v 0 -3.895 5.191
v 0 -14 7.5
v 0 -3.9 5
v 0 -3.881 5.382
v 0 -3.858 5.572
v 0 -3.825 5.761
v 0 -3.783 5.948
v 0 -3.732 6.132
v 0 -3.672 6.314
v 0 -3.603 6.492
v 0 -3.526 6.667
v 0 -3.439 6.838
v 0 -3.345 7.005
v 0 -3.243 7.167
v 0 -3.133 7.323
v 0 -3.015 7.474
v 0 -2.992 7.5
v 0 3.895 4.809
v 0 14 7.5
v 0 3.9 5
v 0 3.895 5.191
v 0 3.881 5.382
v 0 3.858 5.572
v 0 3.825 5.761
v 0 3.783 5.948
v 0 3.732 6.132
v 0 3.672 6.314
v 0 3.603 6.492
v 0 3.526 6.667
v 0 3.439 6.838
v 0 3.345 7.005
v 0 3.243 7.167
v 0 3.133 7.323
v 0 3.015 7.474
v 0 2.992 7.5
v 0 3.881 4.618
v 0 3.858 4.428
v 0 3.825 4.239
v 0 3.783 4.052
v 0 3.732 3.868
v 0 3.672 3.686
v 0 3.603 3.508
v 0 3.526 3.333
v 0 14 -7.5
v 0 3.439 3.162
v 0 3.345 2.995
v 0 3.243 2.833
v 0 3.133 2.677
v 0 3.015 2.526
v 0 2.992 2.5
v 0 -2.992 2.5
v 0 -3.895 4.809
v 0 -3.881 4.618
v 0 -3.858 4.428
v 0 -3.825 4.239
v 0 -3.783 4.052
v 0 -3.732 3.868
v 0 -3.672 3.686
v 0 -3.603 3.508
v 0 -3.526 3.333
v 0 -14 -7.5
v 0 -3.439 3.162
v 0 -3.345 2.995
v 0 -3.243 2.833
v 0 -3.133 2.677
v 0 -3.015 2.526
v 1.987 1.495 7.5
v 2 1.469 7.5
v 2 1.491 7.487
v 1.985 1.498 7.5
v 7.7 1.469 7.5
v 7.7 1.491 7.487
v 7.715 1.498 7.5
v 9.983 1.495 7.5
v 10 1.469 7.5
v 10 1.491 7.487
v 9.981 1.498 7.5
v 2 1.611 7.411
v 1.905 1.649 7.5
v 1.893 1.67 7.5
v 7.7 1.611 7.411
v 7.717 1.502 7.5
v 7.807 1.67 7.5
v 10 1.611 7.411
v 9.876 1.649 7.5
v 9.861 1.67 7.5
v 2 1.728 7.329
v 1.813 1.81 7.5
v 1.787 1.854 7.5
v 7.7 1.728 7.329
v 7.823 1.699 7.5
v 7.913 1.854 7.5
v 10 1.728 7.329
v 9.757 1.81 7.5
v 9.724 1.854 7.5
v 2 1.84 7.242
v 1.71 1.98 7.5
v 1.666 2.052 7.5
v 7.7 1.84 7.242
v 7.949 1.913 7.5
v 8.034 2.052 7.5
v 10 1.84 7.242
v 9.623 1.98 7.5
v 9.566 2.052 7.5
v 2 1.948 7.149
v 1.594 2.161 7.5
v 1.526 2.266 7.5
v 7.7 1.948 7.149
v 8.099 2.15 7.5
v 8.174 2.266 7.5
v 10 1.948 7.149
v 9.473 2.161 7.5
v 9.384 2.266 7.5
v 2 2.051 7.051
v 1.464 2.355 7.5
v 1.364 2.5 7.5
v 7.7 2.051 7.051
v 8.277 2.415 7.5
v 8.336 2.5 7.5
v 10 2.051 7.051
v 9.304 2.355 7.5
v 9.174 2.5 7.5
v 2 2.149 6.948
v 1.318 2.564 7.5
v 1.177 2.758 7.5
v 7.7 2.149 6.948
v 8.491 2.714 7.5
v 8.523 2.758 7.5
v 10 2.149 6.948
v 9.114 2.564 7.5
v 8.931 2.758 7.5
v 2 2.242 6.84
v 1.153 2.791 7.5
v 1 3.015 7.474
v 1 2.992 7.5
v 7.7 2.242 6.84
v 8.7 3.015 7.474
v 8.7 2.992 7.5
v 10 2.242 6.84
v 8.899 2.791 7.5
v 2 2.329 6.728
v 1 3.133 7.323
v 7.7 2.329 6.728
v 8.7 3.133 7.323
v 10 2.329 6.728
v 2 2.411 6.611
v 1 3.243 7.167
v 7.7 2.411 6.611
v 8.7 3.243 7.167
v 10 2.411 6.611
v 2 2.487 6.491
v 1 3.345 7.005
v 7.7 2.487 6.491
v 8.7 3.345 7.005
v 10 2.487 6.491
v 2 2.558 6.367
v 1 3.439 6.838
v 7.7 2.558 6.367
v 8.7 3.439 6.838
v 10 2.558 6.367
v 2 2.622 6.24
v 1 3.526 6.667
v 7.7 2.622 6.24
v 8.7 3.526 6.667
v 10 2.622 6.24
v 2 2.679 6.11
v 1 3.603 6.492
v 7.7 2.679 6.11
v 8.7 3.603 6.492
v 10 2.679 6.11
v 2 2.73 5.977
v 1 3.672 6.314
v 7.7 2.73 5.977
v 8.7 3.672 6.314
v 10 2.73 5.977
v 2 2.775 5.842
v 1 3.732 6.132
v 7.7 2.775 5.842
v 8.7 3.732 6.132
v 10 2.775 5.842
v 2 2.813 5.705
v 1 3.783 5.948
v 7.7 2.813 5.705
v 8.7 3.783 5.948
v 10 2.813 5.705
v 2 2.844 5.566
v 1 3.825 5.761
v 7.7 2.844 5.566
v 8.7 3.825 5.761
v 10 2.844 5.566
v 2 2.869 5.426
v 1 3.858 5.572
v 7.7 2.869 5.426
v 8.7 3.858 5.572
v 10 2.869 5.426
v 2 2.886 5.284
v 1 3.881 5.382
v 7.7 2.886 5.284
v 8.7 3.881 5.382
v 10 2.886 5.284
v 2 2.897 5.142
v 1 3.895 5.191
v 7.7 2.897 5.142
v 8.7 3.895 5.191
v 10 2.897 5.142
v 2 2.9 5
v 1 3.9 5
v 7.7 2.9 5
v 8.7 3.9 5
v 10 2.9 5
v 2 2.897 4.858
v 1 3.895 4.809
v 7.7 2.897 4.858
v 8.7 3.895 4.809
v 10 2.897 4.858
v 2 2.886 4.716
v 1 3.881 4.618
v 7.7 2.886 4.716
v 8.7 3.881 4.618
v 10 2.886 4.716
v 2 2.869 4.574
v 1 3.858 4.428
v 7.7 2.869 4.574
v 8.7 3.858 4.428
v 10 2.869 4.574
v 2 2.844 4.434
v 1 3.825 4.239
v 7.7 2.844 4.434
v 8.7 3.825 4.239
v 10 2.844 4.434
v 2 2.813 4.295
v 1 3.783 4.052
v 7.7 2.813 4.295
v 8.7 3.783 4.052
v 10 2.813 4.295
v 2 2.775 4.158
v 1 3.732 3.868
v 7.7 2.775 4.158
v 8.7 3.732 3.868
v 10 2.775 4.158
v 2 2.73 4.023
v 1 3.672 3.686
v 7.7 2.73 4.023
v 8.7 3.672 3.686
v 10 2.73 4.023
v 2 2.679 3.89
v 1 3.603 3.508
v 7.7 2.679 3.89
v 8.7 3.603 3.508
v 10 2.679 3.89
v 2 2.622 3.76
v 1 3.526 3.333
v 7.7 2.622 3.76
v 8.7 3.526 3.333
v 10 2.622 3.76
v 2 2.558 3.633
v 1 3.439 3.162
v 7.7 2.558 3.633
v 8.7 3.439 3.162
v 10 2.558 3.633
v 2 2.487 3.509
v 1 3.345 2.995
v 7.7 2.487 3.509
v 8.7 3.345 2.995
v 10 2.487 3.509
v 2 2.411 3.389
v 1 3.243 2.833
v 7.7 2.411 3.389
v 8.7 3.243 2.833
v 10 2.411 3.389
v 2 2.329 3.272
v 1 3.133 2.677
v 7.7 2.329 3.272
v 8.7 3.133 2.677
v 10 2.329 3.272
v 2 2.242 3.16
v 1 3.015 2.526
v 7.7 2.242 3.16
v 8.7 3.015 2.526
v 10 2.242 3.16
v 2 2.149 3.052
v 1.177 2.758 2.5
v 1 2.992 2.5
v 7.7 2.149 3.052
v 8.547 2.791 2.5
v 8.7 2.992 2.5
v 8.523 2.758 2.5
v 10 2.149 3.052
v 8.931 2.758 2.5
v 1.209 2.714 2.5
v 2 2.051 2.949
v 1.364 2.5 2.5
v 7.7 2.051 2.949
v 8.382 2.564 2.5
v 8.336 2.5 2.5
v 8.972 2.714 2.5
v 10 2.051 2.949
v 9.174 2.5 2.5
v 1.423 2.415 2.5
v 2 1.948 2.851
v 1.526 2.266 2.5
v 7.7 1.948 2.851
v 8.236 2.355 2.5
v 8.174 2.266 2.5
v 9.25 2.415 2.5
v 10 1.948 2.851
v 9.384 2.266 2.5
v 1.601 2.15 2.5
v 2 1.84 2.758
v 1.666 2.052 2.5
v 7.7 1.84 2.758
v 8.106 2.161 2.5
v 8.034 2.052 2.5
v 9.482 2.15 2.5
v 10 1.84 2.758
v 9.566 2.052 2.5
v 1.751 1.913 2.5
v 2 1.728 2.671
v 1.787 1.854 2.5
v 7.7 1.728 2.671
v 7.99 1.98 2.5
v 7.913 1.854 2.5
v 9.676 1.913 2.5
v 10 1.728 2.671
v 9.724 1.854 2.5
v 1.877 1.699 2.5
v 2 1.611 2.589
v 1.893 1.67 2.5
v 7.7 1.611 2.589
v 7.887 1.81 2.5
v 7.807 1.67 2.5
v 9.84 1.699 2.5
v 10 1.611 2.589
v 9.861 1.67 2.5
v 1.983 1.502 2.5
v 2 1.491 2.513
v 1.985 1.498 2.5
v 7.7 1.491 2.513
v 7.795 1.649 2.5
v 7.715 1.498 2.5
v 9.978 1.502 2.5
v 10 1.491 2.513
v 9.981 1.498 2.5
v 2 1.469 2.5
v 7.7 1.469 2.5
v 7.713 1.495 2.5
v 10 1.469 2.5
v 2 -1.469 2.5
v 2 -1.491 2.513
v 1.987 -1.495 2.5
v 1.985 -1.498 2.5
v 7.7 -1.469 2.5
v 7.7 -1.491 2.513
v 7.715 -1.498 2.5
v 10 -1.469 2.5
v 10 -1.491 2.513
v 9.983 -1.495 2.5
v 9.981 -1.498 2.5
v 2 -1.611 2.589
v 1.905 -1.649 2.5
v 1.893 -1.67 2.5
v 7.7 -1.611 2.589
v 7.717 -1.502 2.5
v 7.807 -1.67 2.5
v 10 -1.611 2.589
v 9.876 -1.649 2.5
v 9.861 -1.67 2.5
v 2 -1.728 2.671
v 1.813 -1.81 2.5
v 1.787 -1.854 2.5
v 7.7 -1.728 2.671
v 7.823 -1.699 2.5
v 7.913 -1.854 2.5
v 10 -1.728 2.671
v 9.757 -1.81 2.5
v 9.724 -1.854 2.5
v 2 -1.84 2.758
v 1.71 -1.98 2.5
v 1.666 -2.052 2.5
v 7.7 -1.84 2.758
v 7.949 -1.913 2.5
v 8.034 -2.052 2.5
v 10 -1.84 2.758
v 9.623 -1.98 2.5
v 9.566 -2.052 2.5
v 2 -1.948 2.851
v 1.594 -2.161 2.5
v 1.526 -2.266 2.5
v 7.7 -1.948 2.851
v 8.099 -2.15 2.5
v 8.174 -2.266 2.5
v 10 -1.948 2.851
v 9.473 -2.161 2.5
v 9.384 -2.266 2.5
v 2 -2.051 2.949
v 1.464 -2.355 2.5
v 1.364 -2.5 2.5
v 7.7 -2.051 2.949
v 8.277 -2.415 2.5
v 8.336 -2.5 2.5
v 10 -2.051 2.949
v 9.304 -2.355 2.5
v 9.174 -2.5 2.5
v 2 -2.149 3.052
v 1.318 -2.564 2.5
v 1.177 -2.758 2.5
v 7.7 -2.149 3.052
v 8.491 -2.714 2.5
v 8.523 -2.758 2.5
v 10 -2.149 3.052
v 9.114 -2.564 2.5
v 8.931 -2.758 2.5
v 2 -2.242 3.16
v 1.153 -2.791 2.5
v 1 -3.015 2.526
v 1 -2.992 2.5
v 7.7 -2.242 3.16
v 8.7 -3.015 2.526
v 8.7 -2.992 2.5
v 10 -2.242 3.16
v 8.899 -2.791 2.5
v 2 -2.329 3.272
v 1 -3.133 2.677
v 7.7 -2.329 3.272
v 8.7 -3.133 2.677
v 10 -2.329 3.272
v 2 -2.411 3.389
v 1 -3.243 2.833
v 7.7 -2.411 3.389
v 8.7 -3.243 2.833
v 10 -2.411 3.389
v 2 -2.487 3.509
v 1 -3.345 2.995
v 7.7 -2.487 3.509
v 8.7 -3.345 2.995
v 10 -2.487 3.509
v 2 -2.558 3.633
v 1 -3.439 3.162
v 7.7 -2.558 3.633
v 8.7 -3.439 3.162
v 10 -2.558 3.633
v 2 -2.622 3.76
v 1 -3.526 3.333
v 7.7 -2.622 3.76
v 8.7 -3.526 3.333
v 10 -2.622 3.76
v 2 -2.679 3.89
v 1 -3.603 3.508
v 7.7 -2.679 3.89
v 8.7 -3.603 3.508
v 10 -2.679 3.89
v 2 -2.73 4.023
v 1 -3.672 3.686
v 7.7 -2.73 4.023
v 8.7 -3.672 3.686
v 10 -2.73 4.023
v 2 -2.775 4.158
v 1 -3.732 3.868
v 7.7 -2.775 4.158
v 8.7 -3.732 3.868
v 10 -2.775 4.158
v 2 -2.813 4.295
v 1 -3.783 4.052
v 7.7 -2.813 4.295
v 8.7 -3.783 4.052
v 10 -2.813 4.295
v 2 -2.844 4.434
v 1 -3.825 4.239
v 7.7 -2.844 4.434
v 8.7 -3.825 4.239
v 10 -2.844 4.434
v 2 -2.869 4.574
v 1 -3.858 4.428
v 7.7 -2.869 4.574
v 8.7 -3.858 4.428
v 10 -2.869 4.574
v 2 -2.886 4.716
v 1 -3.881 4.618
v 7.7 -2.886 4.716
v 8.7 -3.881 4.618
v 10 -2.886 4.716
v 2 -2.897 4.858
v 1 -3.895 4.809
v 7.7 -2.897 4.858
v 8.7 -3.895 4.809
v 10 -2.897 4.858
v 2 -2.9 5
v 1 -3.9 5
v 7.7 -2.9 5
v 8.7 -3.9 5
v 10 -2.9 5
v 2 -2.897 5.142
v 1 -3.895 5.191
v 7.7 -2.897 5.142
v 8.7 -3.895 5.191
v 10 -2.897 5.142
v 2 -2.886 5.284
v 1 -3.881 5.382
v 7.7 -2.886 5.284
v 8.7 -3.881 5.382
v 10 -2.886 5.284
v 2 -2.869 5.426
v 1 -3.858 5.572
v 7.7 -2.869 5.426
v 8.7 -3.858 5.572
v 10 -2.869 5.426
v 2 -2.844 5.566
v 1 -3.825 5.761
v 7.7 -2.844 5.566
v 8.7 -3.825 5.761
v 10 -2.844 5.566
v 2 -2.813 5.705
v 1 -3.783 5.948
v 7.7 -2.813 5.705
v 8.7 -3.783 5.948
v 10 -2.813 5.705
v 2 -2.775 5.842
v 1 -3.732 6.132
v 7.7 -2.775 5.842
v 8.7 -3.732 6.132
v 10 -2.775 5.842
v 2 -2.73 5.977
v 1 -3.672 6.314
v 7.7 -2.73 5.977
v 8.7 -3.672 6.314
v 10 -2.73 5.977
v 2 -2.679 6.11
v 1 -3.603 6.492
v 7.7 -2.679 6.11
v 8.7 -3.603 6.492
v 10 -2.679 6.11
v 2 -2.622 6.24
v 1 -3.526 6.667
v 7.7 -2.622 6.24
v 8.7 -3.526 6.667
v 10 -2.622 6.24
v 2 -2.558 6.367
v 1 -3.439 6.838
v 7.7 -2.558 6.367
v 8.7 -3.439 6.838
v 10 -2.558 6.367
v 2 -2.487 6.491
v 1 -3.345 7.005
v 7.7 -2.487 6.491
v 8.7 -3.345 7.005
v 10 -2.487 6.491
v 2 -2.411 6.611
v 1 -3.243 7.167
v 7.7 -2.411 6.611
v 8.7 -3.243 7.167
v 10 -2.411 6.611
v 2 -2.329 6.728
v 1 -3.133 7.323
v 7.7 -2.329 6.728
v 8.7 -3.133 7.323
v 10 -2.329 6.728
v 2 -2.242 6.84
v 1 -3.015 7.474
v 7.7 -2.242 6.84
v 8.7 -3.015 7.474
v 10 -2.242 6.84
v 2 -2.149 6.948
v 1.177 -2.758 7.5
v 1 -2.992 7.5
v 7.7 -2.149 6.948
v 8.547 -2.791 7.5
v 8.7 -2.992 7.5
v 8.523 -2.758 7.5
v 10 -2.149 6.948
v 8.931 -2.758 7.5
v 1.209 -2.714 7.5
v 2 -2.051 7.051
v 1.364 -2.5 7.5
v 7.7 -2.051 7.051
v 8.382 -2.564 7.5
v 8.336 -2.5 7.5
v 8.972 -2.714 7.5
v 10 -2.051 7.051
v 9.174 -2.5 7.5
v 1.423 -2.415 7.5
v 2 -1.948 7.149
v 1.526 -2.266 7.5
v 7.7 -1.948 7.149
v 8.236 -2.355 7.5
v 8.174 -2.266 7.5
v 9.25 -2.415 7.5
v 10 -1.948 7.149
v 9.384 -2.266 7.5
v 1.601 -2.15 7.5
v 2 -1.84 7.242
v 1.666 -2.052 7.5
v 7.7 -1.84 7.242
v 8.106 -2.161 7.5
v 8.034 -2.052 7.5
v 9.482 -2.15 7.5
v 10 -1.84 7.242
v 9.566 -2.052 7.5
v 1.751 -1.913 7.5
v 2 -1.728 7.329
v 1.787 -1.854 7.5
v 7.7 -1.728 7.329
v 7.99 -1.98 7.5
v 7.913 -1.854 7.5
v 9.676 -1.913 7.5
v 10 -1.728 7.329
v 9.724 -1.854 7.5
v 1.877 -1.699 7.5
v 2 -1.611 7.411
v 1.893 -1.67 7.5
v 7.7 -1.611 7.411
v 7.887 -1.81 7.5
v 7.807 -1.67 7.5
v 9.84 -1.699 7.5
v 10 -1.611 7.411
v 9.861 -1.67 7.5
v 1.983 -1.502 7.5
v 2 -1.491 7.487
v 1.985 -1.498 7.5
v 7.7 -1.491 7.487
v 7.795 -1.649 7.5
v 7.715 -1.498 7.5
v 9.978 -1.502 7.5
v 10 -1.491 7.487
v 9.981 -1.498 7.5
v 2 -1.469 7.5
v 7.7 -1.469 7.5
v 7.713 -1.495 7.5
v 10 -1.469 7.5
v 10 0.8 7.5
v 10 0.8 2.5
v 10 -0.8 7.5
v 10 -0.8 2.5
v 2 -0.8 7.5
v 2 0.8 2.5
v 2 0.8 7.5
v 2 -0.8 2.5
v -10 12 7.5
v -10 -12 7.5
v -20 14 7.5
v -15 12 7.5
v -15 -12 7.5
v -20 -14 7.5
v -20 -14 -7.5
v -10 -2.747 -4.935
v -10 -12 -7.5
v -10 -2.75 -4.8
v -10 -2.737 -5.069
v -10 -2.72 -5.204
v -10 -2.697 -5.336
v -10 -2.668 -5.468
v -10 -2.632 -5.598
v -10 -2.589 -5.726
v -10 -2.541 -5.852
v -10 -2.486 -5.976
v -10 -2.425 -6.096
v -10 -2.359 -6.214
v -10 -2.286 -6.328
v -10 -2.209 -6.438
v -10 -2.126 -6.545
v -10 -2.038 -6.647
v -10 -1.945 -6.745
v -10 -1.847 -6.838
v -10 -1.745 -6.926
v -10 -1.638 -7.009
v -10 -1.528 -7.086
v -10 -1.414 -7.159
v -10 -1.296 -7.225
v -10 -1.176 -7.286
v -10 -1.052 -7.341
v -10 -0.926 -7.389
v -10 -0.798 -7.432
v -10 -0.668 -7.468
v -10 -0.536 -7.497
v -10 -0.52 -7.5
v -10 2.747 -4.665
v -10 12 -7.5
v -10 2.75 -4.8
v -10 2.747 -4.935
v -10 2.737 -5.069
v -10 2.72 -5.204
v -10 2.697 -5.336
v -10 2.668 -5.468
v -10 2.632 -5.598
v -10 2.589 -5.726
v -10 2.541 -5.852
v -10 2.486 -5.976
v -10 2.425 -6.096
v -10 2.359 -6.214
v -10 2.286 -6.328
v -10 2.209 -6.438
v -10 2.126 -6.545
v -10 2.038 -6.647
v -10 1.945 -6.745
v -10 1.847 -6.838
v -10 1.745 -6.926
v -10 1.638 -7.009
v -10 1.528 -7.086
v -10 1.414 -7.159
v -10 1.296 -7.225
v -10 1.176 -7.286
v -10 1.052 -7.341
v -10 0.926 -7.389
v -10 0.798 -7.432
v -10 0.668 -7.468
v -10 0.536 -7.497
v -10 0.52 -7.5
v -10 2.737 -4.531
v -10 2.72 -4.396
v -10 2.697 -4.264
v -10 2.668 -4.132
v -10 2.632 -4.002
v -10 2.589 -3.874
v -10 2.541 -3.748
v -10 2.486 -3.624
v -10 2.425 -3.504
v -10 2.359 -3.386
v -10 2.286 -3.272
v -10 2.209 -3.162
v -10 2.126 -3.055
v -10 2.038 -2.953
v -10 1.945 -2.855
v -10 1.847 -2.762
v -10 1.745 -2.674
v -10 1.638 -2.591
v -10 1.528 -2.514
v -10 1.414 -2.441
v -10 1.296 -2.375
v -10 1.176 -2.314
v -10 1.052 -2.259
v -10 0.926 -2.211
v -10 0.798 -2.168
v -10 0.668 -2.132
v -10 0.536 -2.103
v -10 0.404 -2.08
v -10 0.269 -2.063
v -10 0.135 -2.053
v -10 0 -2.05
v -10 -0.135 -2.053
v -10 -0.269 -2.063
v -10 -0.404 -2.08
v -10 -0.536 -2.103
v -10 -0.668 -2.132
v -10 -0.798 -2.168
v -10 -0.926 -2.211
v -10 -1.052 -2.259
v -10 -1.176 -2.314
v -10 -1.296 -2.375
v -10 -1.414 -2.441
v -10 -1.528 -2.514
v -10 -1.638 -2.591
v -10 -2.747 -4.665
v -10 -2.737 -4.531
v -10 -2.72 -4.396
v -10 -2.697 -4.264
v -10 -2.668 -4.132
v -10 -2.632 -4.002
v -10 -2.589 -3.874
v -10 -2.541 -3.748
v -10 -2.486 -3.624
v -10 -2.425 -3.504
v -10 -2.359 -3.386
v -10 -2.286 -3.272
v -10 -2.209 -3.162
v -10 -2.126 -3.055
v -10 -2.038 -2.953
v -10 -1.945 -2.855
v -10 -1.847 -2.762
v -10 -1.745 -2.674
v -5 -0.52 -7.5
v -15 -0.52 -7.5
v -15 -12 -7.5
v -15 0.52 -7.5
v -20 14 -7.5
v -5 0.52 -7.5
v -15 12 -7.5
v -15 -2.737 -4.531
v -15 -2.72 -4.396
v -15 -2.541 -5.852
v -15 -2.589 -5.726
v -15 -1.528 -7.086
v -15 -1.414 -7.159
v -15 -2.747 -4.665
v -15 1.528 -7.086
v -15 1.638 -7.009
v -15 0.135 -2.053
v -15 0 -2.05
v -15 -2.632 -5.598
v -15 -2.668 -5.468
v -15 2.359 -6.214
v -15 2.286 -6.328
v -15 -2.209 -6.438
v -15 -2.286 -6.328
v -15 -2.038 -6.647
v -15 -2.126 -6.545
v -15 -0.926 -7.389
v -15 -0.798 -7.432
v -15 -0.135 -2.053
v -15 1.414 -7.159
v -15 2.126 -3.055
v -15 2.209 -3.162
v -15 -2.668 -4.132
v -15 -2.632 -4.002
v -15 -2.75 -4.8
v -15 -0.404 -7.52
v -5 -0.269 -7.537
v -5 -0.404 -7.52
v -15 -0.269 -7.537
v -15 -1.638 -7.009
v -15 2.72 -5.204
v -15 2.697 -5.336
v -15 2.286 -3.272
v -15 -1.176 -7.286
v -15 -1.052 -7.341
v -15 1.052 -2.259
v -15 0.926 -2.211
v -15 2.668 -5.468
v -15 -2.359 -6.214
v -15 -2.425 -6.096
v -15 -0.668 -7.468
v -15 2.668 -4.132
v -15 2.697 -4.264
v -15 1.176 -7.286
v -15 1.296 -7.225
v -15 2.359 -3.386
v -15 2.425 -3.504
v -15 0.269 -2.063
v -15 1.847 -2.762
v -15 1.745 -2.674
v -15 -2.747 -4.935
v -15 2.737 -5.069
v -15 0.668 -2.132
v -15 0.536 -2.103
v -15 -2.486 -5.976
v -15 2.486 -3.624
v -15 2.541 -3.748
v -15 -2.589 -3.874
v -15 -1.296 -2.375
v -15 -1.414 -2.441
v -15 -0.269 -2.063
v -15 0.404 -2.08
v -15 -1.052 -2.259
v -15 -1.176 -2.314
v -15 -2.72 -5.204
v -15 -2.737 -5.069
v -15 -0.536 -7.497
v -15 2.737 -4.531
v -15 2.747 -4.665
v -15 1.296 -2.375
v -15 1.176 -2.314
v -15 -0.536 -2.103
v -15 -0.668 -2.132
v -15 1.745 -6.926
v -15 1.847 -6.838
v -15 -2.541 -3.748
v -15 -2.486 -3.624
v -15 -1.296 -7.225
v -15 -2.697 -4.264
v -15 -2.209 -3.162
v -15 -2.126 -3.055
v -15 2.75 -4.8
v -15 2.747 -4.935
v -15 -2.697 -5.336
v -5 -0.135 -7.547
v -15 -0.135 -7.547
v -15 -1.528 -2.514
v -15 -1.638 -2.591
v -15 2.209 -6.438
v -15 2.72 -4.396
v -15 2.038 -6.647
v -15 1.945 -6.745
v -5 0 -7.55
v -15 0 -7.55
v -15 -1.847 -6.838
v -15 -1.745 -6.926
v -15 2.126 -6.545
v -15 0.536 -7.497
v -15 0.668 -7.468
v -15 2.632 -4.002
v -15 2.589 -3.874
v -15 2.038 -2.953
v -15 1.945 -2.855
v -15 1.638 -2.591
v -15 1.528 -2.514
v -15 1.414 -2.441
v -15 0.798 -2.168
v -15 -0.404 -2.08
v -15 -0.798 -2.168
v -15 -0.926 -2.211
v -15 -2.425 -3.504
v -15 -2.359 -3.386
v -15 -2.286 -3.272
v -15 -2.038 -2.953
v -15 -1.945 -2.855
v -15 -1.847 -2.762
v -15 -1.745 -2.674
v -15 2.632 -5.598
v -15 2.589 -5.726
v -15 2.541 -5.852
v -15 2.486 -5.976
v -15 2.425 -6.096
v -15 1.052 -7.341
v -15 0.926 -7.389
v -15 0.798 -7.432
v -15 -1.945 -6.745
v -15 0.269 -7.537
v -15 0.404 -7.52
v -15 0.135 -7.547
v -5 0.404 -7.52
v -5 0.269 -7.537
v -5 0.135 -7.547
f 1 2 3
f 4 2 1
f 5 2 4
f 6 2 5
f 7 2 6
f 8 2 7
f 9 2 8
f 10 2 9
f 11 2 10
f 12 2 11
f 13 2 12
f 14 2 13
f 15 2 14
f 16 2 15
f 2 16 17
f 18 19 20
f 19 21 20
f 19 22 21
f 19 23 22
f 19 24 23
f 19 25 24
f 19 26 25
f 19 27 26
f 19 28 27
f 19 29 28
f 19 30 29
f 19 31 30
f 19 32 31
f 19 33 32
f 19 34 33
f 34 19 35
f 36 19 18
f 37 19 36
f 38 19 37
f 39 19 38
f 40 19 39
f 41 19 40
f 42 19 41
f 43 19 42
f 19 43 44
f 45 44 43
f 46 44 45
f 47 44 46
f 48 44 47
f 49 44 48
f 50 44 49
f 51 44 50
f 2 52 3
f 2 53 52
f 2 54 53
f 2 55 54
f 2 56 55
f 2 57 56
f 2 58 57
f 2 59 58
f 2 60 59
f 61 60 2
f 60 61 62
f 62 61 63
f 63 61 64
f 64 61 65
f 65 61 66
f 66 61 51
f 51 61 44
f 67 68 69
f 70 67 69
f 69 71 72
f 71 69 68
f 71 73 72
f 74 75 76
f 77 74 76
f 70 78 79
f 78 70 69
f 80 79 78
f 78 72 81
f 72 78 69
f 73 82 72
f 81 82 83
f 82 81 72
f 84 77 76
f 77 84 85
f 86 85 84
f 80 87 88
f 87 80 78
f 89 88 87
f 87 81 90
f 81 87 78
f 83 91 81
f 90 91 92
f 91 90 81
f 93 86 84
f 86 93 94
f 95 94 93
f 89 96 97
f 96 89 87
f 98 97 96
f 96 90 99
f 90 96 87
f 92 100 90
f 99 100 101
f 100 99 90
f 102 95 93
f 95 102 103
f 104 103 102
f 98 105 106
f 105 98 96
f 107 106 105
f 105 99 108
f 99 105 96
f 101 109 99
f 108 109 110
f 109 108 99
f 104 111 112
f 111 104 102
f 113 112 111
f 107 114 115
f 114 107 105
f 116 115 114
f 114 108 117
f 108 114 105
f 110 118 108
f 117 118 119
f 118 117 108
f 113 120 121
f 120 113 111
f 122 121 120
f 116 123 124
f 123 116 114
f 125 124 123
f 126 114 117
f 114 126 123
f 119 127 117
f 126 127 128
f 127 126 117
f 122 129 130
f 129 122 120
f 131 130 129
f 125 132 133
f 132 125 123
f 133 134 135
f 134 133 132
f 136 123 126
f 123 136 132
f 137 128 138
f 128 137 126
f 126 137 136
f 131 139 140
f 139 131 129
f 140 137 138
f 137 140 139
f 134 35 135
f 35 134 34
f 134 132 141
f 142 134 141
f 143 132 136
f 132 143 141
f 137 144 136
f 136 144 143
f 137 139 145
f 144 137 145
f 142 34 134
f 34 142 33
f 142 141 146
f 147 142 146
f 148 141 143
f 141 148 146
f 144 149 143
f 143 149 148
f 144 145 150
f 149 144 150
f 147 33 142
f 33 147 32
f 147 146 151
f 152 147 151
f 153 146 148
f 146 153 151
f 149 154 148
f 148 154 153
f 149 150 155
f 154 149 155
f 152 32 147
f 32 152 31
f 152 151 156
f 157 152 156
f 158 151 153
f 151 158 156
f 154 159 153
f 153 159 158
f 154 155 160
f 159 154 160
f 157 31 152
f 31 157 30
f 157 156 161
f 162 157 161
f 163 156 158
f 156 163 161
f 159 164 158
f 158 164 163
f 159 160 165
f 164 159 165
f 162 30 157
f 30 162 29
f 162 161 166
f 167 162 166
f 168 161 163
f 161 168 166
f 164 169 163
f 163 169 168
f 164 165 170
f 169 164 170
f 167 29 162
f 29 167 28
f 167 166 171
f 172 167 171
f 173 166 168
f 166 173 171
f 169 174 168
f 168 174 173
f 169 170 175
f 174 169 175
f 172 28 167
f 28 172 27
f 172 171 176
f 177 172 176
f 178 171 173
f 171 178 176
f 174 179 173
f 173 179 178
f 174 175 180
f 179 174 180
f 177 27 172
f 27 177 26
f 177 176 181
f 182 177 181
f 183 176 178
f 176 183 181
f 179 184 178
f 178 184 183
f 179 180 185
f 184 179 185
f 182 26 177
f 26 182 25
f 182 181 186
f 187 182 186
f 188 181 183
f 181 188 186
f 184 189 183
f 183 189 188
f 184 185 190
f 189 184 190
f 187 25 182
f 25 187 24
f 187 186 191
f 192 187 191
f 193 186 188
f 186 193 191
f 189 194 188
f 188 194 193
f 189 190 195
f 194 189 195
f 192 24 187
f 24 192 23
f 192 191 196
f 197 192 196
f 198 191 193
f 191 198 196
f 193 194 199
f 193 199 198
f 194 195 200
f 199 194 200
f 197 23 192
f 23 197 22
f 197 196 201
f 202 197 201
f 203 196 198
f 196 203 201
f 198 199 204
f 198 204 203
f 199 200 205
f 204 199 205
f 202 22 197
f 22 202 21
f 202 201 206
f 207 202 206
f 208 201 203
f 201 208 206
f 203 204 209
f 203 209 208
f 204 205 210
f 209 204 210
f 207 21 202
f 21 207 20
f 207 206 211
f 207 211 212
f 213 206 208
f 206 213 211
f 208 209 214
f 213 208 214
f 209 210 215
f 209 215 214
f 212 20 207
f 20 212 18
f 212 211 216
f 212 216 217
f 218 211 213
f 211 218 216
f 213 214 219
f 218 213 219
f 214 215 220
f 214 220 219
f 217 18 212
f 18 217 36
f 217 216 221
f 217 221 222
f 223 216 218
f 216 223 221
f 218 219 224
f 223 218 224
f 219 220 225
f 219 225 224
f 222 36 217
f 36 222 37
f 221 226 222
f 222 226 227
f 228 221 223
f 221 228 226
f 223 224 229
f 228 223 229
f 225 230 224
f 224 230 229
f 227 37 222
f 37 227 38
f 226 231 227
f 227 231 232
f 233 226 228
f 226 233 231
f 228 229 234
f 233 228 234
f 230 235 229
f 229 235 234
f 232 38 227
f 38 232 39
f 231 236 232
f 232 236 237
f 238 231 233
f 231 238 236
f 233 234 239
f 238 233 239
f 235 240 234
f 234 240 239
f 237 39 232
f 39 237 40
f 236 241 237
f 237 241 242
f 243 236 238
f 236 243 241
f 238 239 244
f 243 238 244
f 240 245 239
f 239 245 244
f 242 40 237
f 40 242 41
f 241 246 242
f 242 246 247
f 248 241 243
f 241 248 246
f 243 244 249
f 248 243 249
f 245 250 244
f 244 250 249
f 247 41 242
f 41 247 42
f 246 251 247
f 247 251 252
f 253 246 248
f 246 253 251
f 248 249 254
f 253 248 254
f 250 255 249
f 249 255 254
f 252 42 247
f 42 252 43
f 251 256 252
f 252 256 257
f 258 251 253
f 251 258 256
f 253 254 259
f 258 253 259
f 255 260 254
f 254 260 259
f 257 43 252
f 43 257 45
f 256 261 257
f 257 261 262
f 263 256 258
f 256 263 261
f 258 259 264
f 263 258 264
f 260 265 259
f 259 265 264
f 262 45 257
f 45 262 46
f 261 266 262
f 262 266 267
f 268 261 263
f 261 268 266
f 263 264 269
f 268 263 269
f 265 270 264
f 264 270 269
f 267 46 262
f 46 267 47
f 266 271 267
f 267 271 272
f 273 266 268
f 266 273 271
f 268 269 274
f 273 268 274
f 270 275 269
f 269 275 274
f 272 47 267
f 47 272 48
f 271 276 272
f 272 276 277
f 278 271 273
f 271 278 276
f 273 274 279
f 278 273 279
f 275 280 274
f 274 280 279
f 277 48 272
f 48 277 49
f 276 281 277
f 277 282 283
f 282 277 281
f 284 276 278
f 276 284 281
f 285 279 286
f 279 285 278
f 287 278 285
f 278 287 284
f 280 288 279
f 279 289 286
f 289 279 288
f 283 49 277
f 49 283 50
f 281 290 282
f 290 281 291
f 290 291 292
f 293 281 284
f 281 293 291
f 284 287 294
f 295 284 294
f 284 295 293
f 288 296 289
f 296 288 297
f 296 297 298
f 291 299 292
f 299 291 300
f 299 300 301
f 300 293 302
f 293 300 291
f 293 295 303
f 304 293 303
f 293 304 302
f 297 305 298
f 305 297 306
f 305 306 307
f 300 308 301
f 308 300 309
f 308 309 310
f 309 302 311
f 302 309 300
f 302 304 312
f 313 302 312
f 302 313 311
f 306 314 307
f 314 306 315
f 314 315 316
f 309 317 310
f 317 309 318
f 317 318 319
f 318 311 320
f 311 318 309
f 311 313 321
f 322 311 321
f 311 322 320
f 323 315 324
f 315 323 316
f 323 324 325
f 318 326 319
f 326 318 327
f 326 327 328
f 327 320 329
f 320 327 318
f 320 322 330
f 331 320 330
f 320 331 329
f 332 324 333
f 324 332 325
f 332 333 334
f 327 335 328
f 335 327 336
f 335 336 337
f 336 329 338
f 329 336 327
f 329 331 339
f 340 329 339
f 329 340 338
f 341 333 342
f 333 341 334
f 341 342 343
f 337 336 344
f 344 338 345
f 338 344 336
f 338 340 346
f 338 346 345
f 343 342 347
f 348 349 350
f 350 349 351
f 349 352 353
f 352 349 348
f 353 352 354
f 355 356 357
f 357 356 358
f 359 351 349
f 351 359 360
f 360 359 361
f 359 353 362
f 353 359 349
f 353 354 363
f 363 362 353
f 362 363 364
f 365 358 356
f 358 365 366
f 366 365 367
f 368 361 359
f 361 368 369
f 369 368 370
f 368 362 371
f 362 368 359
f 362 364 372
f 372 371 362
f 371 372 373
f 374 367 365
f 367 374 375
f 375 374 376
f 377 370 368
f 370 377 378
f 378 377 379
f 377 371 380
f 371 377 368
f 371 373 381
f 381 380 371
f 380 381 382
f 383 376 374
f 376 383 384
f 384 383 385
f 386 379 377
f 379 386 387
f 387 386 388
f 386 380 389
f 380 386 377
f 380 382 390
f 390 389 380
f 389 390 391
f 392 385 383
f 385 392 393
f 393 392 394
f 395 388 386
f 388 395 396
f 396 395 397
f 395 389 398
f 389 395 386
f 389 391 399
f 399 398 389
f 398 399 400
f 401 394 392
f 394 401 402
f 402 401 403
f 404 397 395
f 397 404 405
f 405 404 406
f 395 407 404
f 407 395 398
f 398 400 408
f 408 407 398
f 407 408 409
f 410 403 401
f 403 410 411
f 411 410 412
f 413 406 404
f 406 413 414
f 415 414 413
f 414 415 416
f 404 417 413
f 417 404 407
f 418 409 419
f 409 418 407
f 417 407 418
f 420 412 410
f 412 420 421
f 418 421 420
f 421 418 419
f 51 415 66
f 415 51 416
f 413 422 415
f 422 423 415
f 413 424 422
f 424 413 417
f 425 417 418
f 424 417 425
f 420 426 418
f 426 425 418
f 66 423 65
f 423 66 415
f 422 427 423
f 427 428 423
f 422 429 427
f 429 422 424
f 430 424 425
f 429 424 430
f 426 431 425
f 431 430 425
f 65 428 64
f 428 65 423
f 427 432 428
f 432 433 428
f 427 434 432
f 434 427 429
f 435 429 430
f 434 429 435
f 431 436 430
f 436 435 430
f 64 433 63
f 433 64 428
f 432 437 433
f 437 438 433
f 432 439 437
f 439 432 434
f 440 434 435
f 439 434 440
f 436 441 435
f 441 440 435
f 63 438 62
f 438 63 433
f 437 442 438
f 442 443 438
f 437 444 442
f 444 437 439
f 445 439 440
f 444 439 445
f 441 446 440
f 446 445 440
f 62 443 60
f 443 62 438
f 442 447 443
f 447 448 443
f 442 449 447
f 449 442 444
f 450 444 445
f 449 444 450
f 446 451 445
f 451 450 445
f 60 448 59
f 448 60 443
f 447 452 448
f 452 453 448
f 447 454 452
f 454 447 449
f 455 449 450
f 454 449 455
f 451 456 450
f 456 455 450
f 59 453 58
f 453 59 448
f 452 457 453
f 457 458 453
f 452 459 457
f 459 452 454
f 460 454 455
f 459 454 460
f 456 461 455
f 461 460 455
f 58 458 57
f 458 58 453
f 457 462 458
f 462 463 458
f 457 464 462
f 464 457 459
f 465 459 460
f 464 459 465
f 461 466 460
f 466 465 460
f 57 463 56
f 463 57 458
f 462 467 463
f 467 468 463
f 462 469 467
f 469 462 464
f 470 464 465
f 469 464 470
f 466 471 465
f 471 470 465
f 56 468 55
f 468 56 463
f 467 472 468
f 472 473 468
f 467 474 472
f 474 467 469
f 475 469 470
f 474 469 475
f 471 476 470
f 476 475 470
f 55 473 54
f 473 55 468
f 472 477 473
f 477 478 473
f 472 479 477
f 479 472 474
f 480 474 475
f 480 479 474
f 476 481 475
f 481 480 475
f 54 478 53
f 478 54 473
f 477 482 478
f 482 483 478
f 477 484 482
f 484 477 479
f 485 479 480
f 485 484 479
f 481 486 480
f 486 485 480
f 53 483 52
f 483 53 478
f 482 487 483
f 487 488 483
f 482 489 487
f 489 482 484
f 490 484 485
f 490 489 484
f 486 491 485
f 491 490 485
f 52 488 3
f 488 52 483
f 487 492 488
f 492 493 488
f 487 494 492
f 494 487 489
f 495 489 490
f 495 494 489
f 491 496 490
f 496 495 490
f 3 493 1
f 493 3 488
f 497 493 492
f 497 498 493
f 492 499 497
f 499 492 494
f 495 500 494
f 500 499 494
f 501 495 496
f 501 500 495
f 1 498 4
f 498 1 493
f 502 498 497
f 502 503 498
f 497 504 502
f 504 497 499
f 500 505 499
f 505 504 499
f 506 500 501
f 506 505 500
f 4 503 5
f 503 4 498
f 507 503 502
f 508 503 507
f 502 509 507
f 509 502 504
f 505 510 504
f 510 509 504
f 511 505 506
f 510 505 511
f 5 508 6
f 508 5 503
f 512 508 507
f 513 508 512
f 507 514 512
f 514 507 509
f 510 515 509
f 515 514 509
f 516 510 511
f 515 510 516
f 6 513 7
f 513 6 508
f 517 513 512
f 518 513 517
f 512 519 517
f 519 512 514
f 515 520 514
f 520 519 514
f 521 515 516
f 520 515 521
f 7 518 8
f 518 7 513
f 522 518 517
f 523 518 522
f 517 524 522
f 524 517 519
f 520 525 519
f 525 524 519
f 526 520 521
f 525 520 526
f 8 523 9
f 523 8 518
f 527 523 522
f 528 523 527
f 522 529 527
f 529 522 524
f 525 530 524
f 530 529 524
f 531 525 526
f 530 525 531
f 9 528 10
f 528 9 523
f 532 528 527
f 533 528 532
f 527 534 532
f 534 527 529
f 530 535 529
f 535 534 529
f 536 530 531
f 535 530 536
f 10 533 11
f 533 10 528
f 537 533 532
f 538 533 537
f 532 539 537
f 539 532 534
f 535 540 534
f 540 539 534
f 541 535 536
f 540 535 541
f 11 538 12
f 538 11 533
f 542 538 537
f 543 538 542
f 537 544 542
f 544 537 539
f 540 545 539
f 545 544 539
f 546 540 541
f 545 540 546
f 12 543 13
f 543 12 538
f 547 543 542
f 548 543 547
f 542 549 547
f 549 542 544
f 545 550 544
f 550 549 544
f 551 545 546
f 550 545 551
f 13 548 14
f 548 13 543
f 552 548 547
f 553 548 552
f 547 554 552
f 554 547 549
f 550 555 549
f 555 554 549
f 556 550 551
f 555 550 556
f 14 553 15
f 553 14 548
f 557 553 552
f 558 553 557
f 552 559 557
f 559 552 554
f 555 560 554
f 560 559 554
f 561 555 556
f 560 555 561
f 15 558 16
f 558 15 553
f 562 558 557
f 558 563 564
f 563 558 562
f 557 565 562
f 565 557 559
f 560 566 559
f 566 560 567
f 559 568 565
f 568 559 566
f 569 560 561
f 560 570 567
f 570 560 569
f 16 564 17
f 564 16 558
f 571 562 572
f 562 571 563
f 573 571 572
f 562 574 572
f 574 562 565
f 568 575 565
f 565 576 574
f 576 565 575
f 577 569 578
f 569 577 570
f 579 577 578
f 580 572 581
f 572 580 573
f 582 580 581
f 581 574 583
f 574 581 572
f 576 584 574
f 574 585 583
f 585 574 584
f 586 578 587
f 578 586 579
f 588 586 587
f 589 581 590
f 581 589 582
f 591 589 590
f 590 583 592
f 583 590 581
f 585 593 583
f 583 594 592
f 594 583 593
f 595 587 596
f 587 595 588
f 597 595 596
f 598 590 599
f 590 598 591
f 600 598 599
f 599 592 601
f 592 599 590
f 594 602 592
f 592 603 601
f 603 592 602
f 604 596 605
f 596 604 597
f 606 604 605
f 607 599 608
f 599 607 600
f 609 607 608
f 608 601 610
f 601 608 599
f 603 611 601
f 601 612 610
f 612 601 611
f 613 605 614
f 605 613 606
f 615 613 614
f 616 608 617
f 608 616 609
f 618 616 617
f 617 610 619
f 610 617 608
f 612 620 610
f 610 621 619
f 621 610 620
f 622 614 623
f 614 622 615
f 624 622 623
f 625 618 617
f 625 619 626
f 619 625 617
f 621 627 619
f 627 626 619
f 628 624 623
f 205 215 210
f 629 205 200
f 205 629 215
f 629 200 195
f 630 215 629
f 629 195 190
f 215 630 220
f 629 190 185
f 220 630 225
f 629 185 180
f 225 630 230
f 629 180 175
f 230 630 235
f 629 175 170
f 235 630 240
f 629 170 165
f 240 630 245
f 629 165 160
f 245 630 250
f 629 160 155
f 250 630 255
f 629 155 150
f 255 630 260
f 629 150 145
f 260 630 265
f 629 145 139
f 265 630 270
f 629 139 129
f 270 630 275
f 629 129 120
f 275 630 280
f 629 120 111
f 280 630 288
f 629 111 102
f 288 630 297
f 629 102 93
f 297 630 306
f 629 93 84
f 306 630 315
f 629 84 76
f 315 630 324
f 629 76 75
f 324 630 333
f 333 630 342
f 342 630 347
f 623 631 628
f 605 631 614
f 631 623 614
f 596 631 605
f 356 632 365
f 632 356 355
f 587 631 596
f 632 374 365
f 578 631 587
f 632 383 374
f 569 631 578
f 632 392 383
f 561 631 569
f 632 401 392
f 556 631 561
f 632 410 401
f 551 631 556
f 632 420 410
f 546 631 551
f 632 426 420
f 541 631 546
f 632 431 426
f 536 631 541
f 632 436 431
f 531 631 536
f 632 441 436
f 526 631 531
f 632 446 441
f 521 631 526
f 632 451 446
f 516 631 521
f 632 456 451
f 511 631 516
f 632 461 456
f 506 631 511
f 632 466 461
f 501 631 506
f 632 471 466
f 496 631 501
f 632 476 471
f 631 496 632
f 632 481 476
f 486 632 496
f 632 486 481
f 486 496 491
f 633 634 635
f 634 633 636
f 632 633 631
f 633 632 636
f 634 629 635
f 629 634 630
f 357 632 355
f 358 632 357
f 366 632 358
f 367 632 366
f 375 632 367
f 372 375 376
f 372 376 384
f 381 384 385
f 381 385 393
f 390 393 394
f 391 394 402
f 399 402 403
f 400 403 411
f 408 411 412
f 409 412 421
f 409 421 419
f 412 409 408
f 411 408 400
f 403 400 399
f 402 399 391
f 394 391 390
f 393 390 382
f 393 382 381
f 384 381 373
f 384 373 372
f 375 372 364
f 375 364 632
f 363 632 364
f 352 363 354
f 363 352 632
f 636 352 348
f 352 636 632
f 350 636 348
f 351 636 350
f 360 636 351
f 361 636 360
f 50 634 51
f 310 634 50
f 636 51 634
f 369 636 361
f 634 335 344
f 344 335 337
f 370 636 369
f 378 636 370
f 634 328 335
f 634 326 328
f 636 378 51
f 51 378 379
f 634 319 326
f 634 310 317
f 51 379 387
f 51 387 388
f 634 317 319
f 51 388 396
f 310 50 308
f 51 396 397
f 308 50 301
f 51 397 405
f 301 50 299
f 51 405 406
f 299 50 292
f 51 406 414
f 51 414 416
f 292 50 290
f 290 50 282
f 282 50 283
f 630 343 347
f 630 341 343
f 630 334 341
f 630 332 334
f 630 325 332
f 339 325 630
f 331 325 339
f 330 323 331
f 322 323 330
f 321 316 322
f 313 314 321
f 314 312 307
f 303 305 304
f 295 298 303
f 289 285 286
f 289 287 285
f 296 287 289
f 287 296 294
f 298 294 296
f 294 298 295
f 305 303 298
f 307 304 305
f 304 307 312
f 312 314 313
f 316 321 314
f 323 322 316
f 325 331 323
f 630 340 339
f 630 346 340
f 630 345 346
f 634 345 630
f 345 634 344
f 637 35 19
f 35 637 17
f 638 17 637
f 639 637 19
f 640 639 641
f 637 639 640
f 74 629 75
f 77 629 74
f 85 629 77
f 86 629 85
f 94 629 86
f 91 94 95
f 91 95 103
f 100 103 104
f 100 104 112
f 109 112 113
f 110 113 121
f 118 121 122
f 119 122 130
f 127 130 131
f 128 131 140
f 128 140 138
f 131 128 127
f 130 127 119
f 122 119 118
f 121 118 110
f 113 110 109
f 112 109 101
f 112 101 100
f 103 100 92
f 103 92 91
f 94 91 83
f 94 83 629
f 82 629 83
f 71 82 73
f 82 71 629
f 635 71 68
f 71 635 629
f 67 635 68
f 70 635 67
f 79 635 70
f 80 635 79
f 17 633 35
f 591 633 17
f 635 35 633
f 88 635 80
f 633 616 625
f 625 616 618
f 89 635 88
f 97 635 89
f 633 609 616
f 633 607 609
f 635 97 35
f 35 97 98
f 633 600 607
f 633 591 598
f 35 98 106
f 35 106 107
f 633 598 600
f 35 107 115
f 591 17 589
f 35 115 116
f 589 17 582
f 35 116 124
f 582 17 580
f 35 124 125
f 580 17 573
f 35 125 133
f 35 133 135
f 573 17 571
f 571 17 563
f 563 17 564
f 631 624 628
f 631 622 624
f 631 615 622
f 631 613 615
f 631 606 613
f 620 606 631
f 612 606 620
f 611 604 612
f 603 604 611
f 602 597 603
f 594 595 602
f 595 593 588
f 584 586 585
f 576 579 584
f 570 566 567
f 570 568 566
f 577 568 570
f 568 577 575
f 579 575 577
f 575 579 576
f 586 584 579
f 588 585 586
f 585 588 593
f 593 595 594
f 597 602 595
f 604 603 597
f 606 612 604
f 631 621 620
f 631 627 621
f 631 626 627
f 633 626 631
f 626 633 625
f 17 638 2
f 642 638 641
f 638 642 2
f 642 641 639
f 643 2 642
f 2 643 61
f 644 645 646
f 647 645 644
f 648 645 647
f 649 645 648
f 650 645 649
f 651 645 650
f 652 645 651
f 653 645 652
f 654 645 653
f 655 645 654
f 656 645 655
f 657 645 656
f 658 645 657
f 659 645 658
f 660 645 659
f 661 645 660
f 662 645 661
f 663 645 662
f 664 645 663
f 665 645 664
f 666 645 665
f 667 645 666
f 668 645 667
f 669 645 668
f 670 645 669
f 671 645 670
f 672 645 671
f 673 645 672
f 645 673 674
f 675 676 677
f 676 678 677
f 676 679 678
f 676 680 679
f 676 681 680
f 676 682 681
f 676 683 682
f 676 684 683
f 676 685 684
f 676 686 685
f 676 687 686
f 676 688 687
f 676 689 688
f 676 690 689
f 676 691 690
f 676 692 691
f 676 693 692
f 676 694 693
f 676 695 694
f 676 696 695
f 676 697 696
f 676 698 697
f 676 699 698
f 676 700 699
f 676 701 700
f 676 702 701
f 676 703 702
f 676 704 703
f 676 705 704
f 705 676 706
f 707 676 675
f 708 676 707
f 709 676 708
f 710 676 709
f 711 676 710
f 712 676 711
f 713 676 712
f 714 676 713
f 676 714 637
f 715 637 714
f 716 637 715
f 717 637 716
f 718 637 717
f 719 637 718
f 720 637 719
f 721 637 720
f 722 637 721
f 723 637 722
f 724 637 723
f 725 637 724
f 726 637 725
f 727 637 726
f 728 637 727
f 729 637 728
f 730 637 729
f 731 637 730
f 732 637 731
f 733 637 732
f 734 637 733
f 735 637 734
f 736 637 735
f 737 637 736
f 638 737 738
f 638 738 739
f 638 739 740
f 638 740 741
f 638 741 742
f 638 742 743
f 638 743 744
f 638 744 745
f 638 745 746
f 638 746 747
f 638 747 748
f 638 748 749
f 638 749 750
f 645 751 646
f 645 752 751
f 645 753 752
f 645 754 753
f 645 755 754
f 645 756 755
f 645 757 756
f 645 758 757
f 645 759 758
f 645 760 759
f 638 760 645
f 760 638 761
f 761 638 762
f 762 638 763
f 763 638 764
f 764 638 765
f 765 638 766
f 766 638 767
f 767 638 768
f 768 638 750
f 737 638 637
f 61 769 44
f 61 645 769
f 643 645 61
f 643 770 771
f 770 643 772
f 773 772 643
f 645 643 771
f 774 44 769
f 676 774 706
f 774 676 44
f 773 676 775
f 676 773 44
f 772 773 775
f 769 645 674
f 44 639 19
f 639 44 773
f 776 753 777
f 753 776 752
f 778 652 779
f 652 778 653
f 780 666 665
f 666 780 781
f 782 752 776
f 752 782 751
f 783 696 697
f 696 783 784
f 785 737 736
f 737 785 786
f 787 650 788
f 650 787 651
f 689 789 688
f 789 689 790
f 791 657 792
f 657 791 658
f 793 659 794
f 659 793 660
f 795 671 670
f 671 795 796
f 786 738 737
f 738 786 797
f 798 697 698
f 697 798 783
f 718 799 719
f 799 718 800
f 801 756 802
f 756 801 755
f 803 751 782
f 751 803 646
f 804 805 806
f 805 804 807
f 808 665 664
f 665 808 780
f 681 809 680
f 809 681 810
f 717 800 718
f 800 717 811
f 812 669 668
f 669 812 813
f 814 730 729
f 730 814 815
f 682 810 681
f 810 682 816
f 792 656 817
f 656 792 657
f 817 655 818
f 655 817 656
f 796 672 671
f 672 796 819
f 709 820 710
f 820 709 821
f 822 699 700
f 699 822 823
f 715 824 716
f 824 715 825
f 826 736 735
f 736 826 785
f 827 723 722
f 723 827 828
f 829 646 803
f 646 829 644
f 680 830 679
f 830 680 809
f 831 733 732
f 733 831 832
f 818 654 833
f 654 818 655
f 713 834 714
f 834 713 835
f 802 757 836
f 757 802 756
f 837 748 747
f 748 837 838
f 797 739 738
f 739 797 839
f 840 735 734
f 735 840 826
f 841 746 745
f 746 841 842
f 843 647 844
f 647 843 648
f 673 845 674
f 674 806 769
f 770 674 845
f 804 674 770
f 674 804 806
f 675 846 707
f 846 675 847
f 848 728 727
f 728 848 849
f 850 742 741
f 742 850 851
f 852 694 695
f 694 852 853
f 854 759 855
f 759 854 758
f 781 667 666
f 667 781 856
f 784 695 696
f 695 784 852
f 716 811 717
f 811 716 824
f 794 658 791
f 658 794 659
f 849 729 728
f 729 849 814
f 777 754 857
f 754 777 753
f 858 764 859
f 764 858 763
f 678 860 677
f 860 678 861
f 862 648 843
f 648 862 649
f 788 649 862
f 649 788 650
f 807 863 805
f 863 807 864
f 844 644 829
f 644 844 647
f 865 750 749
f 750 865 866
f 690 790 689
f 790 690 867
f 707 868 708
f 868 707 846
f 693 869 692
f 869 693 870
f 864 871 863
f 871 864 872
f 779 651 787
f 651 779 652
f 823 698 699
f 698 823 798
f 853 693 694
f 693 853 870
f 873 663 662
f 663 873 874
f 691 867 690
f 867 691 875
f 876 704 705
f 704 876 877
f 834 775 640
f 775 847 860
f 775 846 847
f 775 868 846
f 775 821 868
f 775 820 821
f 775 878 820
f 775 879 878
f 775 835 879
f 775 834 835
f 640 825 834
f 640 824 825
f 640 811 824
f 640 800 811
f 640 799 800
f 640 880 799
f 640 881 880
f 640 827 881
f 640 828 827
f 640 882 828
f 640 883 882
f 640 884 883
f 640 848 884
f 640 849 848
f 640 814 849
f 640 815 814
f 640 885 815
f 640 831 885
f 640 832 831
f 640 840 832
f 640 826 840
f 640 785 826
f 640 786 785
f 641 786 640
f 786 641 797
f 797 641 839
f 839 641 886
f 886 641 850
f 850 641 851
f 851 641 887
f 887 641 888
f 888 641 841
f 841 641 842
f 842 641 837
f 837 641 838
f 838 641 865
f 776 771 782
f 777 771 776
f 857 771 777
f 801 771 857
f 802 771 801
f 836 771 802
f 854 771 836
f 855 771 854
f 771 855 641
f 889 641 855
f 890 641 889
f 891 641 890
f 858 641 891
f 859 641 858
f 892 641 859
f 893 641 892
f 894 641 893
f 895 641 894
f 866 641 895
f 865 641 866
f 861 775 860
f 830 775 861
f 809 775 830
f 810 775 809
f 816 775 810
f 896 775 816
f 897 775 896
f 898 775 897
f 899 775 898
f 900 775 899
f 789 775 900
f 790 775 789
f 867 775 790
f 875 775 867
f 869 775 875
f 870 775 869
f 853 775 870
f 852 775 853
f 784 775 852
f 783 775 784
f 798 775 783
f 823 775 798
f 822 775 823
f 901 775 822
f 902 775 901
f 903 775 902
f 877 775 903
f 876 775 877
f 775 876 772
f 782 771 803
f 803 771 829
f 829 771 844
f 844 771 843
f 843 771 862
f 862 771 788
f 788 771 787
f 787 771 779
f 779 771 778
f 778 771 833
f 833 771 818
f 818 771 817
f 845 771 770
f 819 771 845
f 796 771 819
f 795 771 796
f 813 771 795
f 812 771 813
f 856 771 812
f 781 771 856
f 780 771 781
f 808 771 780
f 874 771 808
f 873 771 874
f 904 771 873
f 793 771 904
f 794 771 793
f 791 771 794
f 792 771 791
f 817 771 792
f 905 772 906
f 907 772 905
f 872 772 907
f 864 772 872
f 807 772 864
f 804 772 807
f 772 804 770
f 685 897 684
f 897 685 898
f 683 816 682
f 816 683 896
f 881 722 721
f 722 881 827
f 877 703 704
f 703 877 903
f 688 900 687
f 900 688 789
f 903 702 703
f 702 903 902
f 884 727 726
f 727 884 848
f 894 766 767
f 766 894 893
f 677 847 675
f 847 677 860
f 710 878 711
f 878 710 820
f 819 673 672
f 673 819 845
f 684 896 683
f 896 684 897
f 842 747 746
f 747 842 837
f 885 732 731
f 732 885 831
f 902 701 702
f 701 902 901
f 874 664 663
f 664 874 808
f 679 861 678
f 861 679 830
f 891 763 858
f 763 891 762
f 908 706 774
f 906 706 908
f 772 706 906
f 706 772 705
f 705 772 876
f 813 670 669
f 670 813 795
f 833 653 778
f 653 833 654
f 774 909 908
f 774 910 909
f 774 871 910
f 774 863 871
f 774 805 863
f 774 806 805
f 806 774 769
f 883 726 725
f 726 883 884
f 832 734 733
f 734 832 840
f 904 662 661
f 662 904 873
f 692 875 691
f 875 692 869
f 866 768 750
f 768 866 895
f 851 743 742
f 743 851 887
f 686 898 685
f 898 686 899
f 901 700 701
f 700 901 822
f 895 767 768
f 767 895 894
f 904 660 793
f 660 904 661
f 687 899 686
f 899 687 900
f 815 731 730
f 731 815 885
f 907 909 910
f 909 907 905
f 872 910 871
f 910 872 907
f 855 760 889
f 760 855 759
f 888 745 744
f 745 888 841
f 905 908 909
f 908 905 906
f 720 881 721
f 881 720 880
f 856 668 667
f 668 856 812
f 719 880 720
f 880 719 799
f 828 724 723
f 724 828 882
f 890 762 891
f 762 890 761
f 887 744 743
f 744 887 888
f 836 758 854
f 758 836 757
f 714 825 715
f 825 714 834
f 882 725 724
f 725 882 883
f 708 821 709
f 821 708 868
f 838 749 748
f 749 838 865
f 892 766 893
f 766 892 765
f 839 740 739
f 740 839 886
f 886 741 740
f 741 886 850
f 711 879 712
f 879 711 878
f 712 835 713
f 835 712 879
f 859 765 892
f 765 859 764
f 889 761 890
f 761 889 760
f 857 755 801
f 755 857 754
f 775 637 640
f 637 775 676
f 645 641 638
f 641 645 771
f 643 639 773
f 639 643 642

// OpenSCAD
rotate([0.0, -90.0, 0.0])
{
    union()
    {
        rotate([0.0, 90.0, 0.0])
        {
            translate([0.0, 0.0, 5.0])
            {
                rotate([0.0, 90.0, 0.0])
                {
                    intersection()
                    {
                        difference()
                        {
                            rotate_extrude(angle = 360.0, $fn = 128)
                            {
                                M66();
                            }
                            translate([0.0, 0.0, 2.0])
                            {
                                linear_extrude(height = 10.0, twist = 0.0, scale = 1.0, slices = 1, center = false)
                                {
                                    scale([10.0, 1.6])
                                    {
                                        M8();
                                    }
                                }
                            }
                        }
                        linear_extrude(height = 10.0, twist = 0.0, scale = 1.0, slices = 1, center = false)
                        {
                            scale([5.0, 10.0])
                            {
                                M8();
                            }
                        }
                    }
                }
            }
        }
        translate([0.0, 0.0, 0.0])
        {
            linear_extrude(height = 10.0, twist = 0.0, scale = 1.0, slices = 1, center = false)
            {
                scale([15.0, 28.0])
                {
                    M8();
                }
            }
        }
        translate([-4.8, 0.0, 5.0])
        {
            translate([0.0, 0.0, 5.0])
            {
                linear_extrude(height = 10.0, twist = 0.0, scale = 1.0, slices = 1, center = true)
                {
                    scale([5.5, 5.5])
                    {
                        M211();
                    }
                }
            }
        }
        translate([0.0, 13.0, 10.0])
        {
            linear_extrude(height = 5.0, twist = 0.0, scale = 1.0, slices = 1, center = false)
            {
                scale([15.0, 2.0])
                {
                    M8();
                }
            }
        }
        translate([0.0, -13.0, 10.0])
        {
            linear_extrude(height = 5.0, twist = 0.0, scale = 1.0, slices = 1, center = false)
            {
                scale([15.0, 2.0])
                {
                    M8();
                }
            }
        }
        translate([0.0, 0.0, 15.0])
        {
            linear_extrude(height = 5.0, twist = 0.0, scale = 1.0, slices = 1, center = false)
            {
                scale([15.0, 28.0])
                {
                    M8();
                }
            }
        }
    }
}

module M66()
{
    polygon
    (
        points =
        [
            [0.0, 0.0], 
            [3.9, 0.0], 
            [3.9, 1.0], 
            [2.9, 2.0], 
            [2.9, 7.7], 
            [3.9, 8.7], 
            [2.9, 10.0], 
            [0.0, 10.0], 
            [0.0, 2.0]
        ],
        paths =
        [
            [0, 1, 2, 3, 4, 5, 6, 7, 8]
        ]
    );
}

module M211()
{
    polygon
    (
        points =
        [
            [0.5, 0.0], 
            [0.4993977281025862, 0.024533837163709007], 
            [0.49759236333609846, 0.0490085701647803], 
            [0.4945882549823905, 0.07336523722768087], 
            [0.4903926402016152, 0.09754516100806412], 
            [0.485015626597272, 0.12149008995163194], 
            [0.4784701678661044, 0.14514233862723117], 
            [0.4707720325915104, 0.16844492669611003], 
            [0.46193976625564337, 0.1913417161825449], 
            [0.45199464656172167, 0.21377754671514104], 
            [0.4409606321741775, 0.23569836841299882], 
            [0.42886430500013606, 0.25705137209661083], 
            [0.4157348061512726, 0.2777851165098011], 
            [0.40160376574032247, 0.2978496522462167], 
            [0.3865052266813685, 0.31719664208182274], 
            [0.37047556267747955, 0.33577947742350917], 
            [0.3535533905932738, 0.35355339059327373], 
            [0.33577947742350917, 0.37047556267747955], 
            [0.31719664208182274, 0.3865052266813685], 
            [0.29784965224621673, 0.4016037657403224], 
            [0.27778511650980114, 0.4157348061512726], 
            [0.25705137209661083, 0.42886430500013606], 
            [0.2356983684129989, 0.44096063217417747], 
            [0.2137775467151411, 0.45199464656172167], 
            [0.19134171618254492, 0.46193976625564337], 
            [0.16844492669611003, 0.4707720325915104], 
            [0.14514233862723117, 0.47847016786610447], 
            [0.12149008995163199, 0.485015626597272], 
            [0.09754516100806417, 0.4903926402016152], 
            [0.07336523722768087, 0.4945882549823905], 
            [0.049008570164780385, 0.4975923633360984], 
            [0.024533837163709063, 0.4993977281025862], 
            [3.061616997868383E-17, 0.5], 
            [-0.024533837163709004, 0.4993977281025862], 
            [-0.04900857016478032, 0.49759236333609846], 
            [-0.07336523722768082, 0.4945882549823905], 
            [-0.0975451610080641, 0.4903926402016152], 
            [-0.12149008995163194, 0.485015626597272], 
            [-0.14514233862723108, 0.47847016786610447], 
            [-0.16844492669610997, 0.4707720325915104], 
            [-0.19134171618254486, 0.46193976625564337], 
            [-0.21377754671514093, 0.4519946465617217], 
            [-0.23569836841299885, 0.4409606321741775], 
            [-0.25705137209661083, 0.42886430500013606], 
            [-0.277785116509801, 0.41573480615127273], 
            [-0.2978496522462167, 0.40160376574032247], 
            [-0.3171966420818227, 0.38650522668136855], 
            [-0.3357794774235092, 0.3704755626774795], 
            [-0.35355339059327373, 0.3535533905932738], 
            [-0.37047556267747944, 0.3357794774235093], 
            [-0.3865052266813685, 0.31719664208182274], 
            [-0.4016037657403224, 0.29784965224621673], 
            [-0.4157348061512727, 0.2777851165098011], 
            [-0.428864305000136, 0.2570513720966109], 
            [-0.44096063217417747, 0.23569836841299893], 
            [-0.45199464656172167, 0.21377754671514101], 
            [-0.46193976625564337, 0.19134171618254495], 
            [-0.47077203259151035, 0.16844492669611016], 
            [-0.4784701678661044, 0.1451423386272312], 
            [-0.485015626597272, 0.12149008995163203], 
            [-0.4903926402016152, 0.0975451610080643], 
            [-0.4945882549823905, 0.0733652372276809], 
            [-0.4975923633360984, 0.04900857016478041], 
            [-0.4993977281025862, 0.024533837163708983], 
            [-0.5, 6.123233995736766E-17], 
            [-0.4993977281025862, -0.024533837163708862], 
            [-0.49759236333609846, -0.049008570164780295], 
            [-0.4945882549823905, -0.07336523722768079], 
            [-0.4903926402016152, -0.09754516100806418], 
            [-0.485015626597272, -0.12149008995163191], 
            [-0.47847016786610447, -0.14514233862723105], 
            [-0.4707720325915104, -0.16844492669611005], 
            [-0.4619397662556434, -0.19134171618254484], 
            [-0.4519946465617217, -0.2137775467151409], 
            [-0.4409606321741775, -0.23569836841299882], 
            [-0.42886430500013606, -0.2570513720966108], 
            [-0.41573480615127273, -0.277785116509801], 
            [-0.40160376574032247, -0.2978496522462166], 
            [-0.38650522668136855, -0.31719664208182263], 
            [-0.37047556267747955, -0.3357794774235092], 
            [-0.35355339059327384, -0.35355339059327373], 
            [-0.33577947742350933, -0.37047556267747944], 
            [-0.31719664208182297, -0.38650522668136833], 
            [-0.29784965224621657, -0.4016037657403225], 
            [-0.2777851165098011, -0.4157348061512726], 
            [-0.2570513720966109, -0.428864305000136], 
            [-0.23569836841299893, -0.44096063217417747], 
            [-0.21377754671514124, -0.45199464656172156], 
            [-0.19134171618254517, -0.46193976625564326], 
            [-0.16844492669610997, -0.4707720325915104], 
            [-0.14514233862723122, -0.4784701678661044], 
            [-0.12149008995163206, -0.485015626597272], 
            [-0.09754516100806433, -0.49039264020161516], 
            [-0.07336523722768115, -0.49458825498239045], 
            [-0.049008570164780225, -0.49759236333609846], 
            [-0.024533837163709014, -0.4993977281025862], 
            [-9.184850993605148E-17, -0.5], 
            [0.02453383716370883, -0.4993977281025862], 
            [0.049008570164780045, -0.49759236333609846], 
            [0.07336523722768097, -0.49458825498239045], 
            [0.09754516100806415, -0.4903926402016152], 
            [0.12149008995163188, -0.485015626597272], 
            [0.14514233862723103, -0.47847016786610447], 
            [0.1684449266961098, -0.47077203259151046], 
            [0.191341716182545, -0.4619397662556433], 
            [0.21377754671514107, -0.45199464656172167], 
            [0.2356983684129988, -0.4409606321741775], 
            [0.2570513720966108, -0.4288643050001361], 
            [0.2777851165098009, -0.41573480615127273], 
            [0.29784965224621646, -0.40160376574032264], 
            [0.3171966420818228, -0.38650522668136844], 
            [0.33577947742350917, -0.37047556267747955], 
            [0.3535533905932737, -0.35355339059327384], 
            [0.37047556267747944, -0.33577947742350933], 
            [0.38650522668136833, -0.31719664208182297], 
            [0.4016037657403225, -0.2978496522462166], 
            [0.4157348061512726, -0.2777851165098011], 
            [0.428864305000136, -0.25705137209661094], 
            [0.4409606321741774, -0.23569836841299896], 
            [0.45199464656172156, -0.21377754671514126], 
            [0.46193976625564326, -0.1913417161825452], 
            [0.4707720325915104, -0.16844492669611], 
            [0.4784701678661044, -0.14514233862723125], 
            [0.485015626597272, -0.12149008995163209], 
            [0.49039264020161516, -0.09754516100806436], 
            [0.49458825498239045, -0.0733652372276812], 
            [0.49759236333609846, -0.04900857016478025], 
            [0.4993977281025862, -0.024533837163709046]
        ],
        paths =
        [
            [0, 1, 2, 3, 4, 5, 6, 7, 8, 9, 10, 11, 12, 13, 14, 15, 16, 17, 18, 19, 20, 21, 22, 23, 24, 25, 26, 27, 28, 29, 30, 31, 32, 33, 34, 35, 36, 37, 38, 39, 40, 41, 42, 43, 44, 45, 46, 47, 48, 49, 50, 51, 52, 53, 54, 55, 56, 57, 58, 59, 60, 61, 62, 63, 64, 65, 66, 67, 68, 69, 70, 71, 72, 73, 74, 75, 76, 77, 78, 79, 80, 81, 82, 83, 84, 85, 86, 87, 88, 89, 90, 91, 92, 93, 94, 95, 96, 97, 98, 99, 100, 101, 102, 103, 104, 105, 106, 107, 108, 109, 110, 111, 112, 113, 114, 115, 116, 117, 118, 119, 120, 121, 122, 123, 124, 125, 126, 127]
        ]
    );
}

module M8()
{
    polygon
    (
        points =
        [
            [-0.5, -0.5], 
            [0.5, -0.5], 
            [0.5, 0.5], 
            [-0.5, 0.5]
        ],
        paths =
        [
            [0, 1, 2, 3]
        ]
    );
}
